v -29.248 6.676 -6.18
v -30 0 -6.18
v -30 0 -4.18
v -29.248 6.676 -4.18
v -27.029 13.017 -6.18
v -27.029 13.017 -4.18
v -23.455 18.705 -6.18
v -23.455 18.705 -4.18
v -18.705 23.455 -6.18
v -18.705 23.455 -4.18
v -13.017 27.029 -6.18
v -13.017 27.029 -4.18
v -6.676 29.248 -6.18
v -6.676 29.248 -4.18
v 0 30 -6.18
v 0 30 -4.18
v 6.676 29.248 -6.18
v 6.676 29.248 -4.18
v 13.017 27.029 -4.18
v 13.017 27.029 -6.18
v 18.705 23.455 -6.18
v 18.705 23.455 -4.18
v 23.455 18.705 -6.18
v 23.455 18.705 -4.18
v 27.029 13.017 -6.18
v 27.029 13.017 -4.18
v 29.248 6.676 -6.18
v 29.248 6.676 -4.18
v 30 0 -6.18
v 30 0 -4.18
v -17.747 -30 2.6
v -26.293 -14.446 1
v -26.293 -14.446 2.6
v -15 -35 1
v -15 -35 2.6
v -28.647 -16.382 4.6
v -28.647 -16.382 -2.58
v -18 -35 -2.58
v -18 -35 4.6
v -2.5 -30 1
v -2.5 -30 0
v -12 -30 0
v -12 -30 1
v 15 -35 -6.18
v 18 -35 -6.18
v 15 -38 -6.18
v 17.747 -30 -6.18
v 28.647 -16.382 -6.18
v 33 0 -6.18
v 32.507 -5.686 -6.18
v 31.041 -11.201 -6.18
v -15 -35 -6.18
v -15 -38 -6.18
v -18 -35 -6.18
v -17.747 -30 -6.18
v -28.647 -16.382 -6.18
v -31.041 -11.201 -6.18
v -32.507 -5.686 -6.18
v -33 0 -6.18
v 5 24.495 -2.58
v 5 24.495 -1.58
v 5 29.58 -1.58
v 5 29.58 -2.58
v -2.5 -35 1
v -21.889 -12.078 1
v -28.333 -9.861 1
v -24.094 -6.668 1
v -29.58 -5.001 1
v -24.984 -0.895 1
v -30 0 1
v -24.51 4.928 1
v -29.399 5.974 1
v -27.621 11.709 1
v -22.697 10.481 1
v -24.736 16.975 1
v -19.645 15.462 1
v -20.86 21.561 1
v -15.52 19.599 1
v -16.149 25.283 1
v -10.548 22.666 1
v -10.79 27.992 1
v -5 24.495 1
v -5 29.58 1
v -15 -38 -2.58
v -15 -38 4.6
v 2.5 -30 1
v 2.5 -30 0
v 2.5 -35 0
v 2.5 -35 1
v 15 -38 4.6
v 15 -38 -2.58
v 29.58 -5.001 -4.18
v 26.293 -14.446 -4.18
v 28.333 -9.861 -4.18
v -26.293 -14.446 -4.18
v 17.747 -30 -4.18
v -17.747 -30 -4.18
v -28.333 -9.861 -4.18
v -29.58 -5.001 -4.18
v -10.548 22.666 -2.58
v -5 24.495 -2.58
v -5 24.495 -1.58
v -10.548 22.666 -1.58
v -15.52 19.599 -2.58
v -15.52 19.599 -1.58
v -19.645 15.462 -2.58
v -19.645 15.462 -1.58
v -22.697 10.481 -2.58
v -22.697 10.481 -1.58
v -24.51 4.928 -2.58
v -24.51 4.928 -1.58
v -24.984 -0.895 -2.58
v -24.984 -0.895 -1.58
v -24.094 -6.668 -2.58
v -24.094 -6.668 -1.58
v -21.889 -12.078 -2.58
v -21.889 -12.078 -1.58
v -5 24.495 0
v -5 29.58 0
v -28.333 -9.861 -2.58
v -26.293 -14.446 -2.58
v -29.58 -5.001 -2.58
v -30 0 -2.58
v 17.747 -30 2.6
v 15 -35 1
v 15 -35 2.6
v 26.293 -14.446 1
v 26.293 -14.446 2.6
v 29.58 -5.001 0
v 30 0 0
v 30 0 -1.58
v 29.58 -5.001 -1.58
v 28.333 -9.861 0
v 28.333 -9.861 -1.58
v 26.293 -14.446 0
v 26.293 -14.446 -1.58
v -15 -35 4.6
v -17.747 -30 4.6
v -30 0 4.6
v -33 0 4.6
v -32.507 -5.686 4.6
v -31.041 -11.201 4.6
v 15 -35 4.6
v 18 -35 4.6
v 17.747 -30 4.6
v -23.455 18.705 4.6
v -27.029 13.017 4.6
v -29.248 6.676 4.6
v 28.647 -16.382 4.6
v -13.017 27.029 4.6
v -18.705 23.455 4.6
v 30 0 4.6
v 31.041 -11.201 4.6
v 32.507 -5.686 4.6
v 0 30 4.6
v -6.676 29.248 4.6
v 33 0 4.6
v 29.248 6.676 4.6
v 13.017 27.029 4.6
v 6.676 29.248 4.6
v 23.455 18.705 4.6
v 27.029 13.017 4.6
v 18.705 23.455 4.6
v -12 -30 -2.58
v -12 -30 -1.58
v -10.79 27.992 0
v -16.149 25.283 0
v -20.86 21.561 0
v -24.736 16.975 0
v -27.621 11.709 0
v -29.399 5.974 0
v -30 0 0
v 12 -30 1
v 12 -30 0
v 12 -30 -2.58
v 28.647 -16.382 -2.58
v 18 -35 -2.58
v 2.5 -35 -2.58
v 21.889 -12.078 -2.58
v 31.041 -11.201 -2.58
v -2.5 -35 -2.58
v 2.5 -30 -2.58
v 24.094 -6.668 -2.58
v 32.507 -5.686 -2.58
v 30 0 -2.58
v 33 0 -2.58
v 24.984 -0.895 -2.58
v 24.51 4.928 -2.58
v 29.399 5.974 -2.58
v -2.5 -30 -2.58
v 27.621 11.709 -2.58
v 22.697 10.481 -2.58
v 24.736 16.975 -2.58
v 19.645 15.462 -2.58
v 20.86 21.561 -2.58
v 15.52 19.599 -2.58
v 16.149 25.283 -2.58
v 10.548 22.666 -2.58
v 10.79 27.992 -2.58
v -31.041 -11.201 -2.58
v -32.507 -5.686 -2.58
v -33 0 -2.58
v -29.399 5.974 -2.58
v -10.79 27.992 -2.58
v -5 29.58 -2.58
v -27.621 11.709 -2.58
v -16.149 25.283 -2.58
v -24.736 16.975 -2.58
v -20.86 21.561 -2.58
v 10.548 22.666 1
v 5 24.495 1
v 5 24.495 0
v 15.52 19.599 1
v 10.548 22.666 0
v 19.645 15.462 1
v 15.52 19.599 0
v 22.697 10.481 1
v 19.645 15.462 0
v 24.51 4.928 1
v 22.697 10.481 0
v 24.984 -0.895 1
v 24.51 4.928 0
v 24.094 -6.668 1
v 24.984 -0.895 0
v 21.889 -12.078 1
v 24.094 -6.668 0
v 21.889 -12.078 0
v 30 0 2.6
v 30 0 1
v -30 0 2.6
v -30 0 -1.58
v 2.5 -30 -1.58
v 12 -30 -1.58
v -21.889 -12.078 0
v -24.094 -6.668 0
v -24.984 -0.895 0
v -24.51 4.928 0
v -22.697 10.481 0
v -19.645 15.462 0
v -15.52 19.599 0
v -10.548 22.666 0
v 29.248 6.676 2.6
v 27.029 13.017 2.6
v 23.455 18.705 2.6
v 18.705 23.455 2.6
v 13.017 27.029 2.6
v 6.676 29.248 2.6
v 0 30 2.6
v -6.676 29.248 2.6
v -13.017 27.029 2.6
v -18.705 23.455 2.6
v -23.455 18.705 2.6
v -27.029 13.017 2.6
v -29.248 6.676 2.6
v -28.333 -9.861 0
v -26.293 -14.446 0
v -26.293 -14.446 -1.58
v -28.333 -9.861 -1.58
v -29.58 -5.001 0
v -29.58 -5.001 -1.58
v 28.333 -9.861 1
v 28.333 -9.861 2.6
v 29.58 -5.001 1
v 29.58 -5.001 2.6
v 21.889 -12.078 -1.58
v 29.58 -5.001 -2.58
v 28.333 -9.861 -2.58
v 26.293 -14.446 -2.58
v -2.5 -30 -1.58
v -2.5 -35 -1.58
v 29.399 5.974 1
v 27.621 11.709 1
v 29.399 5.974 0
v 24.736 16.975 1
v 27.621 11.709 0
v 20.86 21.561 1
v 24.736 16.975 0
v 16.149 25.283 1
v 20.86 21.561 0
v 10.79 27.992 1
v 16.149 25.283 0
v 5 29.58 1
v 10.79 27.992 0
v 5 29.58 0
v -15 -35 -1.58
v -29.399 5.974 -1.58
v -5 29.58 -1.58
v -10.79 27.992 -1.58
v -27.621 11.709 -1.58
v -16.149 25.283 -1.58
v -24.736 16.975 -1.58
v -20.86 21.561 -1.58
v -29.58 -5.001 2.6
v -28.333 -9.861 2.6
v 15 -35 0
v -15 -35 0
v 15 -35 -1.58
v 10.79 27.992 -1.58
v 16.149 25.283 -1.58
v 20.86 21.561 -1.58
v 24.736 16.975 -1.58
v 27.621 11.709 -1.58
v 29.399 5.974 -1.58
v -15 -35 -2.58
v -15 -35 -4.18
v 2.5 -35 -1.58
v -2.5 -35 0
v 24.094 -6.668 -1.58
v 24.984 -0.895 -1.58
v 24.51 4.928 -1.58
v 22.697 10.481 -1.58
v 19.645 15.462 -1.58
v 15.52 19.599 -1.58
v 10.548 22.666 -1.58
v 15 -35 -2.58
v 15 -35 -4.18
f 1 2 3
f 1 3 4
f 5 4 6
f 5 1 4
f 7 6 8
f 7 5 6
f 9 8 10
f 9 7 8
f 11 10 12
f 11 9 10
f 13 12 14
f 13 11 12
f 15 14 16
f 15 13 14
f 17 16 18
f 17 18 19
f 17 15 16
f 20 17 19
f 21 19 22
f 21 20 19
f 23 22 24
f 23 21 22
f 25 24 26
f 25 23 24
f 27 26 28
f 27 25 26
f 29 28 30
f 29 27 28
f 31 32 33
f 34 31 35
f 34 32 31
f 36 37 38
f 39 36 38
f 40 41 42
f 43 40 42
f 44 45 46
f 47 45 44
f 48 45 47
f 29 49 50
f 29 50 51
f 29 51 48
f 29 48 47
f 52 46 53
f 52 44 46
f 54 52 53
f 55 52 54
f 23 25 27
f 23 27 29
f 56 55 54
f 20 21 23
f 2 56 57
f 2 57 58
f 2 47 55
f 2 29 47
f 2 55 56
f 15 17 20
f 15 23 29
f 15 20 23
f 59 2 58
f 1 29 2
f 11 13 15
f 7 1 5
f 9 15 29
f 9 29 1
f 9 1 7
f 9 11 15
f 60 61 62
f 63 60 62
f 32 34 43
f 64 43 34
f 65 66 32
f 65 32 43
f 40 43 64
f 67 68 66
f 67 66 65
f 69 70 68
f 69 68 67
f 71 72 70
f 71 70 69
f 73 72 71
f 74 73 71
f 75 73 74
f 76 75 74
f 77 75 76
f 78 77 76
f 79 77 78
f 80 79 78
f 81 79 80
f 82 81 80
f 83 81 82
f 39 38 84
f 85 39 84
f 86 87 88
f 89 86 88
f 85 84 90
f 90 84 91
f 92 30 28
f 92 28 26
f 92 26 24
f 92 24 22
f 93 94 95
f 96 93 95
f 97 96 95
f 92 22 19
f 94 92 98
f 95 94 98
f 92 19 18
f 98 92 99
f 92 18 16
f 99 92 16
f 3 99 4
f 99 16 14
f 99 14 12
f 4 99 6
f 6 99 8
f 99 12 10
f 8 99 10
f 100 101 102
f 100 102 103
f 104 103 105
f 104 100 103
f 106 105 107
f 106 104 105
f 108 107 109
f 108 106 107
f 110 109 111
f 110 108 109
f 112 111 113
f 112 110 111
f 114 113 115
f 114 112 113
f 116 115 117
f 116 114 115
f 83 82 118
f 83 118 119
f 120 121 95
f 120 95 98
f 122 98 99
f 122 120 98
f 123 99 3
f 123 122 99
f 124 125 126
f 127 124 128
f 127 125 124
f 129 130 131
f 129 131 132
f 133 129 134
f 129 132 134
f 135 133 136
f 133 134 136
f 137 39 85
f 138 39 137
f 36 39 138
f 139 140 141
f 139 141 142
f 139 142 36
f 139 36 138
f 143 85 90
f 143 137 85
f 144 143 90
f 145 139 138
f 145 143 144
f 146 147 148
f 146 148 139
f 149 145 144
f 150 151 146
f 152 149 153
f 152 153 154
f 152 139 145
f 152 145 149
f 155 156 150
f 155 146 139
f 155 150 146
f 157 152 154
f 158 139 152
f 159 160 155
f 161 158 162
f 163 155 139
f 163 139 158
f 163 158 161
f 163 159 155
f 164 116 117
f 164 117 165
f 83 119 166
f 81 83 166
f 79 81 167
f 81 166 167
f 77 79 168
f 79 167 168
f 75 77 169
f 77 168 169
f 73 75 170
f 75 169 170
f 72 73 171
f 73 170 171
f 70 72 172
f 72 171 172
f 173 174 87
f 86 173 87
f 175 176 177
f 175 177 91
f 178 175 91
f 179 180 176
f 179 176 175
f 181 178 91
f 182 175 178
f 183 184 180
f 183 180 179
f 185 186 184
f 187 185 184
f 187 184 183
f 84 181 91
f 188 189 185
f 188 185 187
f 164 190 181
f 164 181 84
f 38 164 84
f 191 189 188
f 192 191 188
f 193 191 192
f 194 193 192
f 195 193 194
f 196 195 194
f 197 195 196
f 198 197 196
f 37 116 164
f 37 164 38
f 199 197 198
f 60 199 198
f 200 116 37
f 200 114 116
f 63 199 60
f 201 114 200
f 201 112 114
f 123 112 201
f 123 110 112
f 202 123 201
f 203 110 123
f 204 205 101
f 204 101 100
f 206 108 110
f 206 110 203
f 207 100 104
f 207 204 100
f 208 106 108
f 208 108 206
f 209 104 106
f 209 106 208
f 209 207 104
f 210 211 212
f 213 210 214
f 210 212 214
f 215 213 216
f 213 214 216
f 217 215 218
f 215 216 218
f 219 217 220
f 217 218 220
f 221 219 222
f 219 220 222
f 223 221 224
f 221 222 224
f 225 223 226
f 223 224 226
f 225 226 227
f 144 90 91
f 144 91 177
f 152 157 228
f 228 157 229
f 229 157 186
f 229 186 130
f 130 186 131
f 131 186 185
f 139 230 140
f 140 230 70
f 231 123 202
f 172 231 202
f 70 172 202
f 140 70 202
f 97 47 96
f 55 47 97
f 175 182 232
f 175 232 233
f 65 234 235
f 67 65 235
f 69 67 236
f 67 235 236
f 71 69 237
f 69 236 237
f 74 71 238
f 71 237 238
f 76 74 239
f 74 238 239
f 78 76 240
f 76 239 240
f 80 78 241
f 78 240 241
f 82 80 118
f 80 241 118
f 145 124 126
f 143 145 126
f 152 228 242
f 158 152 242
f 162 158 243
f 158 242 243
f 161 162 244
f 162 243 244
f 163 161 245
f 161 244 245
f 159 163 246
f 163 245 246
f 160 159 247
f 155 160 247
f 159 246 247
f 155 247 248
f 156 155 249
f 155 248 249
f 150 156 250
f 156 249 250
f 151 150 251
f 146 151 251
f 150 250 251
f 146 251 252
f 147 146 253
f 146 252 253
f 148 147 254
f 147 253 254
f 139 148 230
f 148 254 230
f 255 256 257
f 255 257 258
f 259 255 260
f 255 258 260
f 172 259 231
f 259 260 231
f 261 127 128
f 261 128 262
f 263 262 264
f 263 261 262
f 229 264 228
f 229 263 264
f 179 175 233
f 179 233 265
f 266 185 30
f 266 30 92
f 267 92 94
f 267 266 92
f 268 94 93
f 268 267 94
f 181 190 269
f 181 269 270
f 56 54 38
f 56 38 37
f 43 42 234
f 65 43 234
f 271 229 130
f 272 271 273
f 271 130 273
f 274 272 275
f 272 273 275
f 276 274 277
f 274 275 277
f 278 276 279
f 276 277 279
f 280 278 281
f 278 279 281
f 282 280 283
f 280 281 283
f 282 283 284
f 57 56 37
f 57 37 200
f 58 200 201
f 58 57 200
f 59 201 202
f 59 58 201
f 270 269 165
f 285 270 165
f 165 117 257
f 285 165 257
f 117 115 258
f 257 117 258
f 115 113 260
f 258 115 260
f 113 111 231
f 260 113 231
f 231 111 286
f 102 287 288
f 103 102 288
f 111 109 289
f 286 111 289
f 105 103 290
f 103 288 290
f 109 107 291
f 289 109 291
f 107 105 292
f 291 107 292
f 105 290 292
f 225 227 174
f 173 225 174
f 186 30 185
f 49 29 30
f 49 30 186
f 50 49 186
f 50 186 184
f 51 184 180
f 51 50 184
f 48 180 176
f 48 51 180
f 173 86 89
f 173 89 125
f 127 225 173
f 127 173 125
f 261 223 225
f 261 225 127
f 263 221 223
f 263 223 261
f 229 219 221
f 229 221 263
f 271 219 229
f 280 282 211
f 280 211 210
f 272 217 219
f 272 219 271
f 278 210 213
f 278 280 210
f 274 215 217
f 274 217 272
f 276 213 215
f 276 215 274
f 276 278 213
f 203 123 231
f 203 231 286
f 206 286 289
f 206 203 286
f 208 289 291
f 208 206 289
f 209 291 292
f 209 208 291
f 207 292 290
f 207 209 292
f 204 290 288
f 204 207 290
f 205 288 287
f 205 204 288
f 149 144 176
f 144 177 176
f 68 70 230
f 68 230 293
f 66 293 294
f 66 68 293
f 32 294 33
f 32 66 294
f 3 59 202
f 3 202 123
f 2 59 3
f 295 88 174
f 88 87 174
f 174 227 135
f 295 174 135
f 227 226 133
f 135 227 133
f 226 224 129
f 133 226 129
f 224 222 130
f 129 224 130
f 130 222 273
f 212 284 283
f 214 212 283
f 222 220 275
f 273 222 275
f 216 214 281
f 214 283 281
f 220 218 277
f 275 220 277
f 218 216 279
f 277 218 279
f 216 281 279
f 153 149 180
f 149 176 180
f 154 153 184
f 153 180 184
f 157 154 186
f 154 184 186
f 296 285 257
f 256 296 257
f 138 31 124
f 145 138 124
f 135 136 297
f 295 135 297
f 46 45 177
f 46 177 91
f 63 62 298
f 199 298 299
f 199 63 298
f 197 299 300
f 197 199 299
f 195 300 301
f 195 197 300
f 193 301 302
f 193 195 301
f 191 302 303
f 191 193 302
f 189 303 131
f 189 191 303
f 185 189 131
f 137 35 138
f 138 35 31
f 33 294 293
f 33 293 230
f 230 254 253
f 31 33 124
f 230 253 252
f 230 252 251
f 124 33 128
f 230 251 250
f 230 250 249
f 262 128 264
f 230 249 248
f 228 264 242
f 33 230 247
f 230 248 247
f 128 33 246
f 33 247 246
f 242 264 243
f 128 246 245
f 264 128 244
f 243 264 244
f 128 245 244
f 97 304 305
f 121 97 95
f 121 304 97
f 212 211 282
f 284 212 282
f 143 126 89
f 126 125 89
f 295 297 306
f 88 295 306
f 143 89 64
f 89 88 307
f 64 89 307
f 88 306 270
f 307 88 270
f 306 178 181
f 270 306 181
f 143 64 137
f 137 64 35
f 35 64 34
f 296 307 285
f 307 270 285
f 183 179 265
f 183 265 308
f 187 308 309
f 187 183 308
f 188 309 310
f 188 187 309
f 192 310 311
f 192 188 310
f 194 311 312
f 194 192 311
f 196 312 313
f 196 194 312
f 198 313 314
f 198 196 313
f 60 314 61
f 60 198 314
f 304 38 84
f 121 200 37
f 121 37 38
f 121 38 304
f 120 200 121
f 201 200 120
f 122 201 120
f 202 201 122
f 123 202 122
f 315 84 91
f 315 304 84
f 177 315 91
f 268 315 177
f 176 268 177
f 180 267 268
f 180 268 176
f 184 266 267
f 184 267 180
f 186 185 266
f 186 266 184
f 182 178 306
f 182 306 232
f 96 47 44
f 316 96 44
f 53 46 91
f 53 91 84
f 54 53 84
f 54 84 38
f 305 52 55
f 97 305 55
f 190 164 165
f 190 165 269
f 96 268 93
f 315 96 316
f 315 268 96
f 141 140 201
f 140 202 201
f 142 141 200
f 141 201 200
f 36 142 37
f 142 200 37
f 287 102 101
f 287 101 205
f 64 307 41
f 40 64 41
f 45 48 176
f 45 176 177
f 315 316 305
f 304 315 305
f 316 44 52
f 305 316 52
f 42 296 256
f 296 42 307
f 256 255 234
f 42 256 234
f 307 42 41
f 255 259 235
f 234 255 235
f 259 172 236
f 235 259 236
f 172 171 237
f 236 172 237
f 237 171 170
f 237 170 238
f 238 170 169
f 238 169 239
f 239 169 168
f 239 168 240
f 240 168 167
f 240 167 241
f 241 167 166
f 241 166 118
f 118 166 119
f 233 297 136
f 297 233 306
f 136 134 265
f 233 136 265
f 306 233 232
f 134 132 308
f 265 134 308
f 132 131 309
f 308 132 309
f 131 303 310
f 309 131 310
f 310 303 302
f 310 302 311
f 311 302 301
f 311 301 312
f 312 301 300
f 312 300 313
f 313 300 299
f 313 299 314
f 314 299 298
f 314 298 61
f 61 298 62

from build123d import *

# Parameters (mm, degrees)
RESSALTO_EXTRUS_O3_DEPTH = 1
RESSALTO_EXTRUS_O4_START = -3.58
RESSALTO_EXTRUS_O4_DEPTH = 3.58
RESSALTO_EXTRUS_O5_DEPTH = 1
RESSALTO_EXTRUS_O6_DEPTH = 1.6
RESSALTO_EXTRUS_O7_DEPTH = 1.6
ESBO_O9_W                = 10
ESBO_O9_H                = 12.857862002
CORTE_EXTRUS_O2_DEPTH    = 4
RESSALTO_EXTRUS_O8_DEPTH = 2
RESSALTO_EXTRUS_O9_START = 2
RESSALTO_EXTRUS_O9_DEPTH = 2


with BuildPart() as part:
    # Esboço1 → Ressalto-extrusão3 (new body)
    with BuildSketch(Plane.XY):
        with BuildLine():
            Line((5, -35), (15, -35))
            Line((15, -35), (26.292884648, -14.44590658))
            ThreePointArc((26.292884648, -14.44590658), (0, 30), (-26.292884648, -14.44590658))
            Line((-26.292884648, -14.44590658), (-15, -35))
            Line((-15, -35), (-5, -35))
            Line((-5, -35), (-2.5, -35))
            Line((-2.5, -35), (-2.5, -32.5))
            Line((-2.5, -32.5), (-2.5, -30))
            Line((-2.5, -30), (-5, -30))
            Line((-5, -30), (-12, -30))
            Line((-12, -30), (-21.889001071, -12.077732905))
            ThreePointArc((-21.889001071, -12.077732905), (0, 25), (21.889001071, -12.077732905))
            Line((21.889001071, -12.077732905), (12, -30))
            Line((12, -30), (5, -30))
            Line((5, -30), (2.5, -30))
            Line((2.5, -30), (2.5, -32.5))
            Line((2.5, -32.5), (2.5, -35))
            Line((2.5, -35), (5, -35))
        make_face()
    extrude(amount=RESSALTO_EXTRUS_O3_DEPTH)

    # Esboço2 → Ressalto-extrusão4 (add)
    with BuildSketch(Plane.XY.offset(1).offset(RESSALTO_EXTRUS_O4_START)):
        Polygon((-2.5, -35), (-15, -35), (-15, -38), (15, -38), (15, -35), (2.5, -35), align=None)
        Polygon((18, -35), (15, -38), (15, -35), align=None)
        with BuildLine():
            Line((33, 0), (30, 0))
            ThreePointArc((30, 0), (29.058445755, -7.45699204), (26.292884648, -14.44590658))
            Line((26.292884648, -14.44590658), (15, -35))
            Line((15, -35), (18, -35))
            Line((18, -35), (28.646862641, -16.381613499))
            ThreePointArc((28.646862641, -16.381613499), (31.893153397, -8.47506734), (33, 0))
        make_face()
        Polygon((-15, -35), (-18, -35), (-15, -38), align=None)
        with BuildLine():
            ThreePointArc((-26.292884648, -14.44590658), (-29.058445755, -7.45699204), (-30, 0))
            Line((-30, 0), (-33, 0))
            ThreePointArc((-33, 0), (-31.893153397, -8.47506734), (-28.646862641, -16.381613499))
            Line((-28.646862641, -16.381613499), (-18, -35))
            Line((-18, -35), (-15, -35))
            Line((-15, -35), (-26.292884648, -14.44590658))
        make_face()
    extrude(amount=RESSALTO_EXTRUS_O4_DEPTH)

    # Esboço4 → Ressalto-extrusão5 (add)
    with BuildSketch(Plane(origin=(0, 0, -2.58), x_dir=(-1, 0, 0), z_dir=(0, 0, -1))):
        with BuildLine():
            Line((-15, -35), (-2.5, -35))
            Line((-2.5, -35), (-2.5, -30))
            Line((-2.5, -30), (-12, -30))
            Line((-12, -30), (-21.889001071, -12.077732905))
            ThreePointArc((-21.889001071, -12.077732905), (0, 25), (21.889001071, -12.077732905))
            Line((21.889001071, -12.077732905), (12, -30))
            Line((12, -30), (2.5, -30))
            Line((2.5, -30), (2.5, -35))
            Line((2.5, -35), (15, -35))
            Line((15, -35), (26.292884648, -14.44590658))
            ThreePointArc((26.292884648, -14.44590658), (0, 30), (-26.292884648, -14.44590658))
            Line((-26.292884648, -14.44590658), (-15, -35))
        make_face()
    extrude(amount=-RESSALTO_EXTRUS_O5_DEPTH)

    # Esboço5 → Ressalto-extrusão6 (add)
    with BuildSketch(Plane.XY.offset(1)):
        with BuildLine():
            Line((-15, -38), (-18, -35))
            Line((-18, -35), (-28.646862641, -16.381613499))
            ThreePointArc((-28.646862641, -16.381613499), (-31.893153397, -8.47506734), (-33, 0))
            Line((-33, 0), (-29.999999999, 0))
            ThreePointArc((-29.999999999, 0), (-29.058445755, -7.456992039), (-26.292884647, -14.445906578))
            Line((-26.292884647, -14.445906578), (-15, -35))
            Line((-15, -35), (-12.5, -35))
            Line((-12.5, -35), (0, -35))
            Line((0, -35), (12.5, -35))
            Line((12.5, -35), (14.999999999, -35))
            Line((14.999999999, -35), (26.292884647, -14.445906579))
            ThreePointArc((26.292884647, -14.445906579), (29.058445755, -7.45699204), (29.999999999, 0))
            Line((29.999999999, 0), (33, 0))
            ThreePointArc((33, 0), (31.893153397, -8.47506734), (28.646862641, -16.381613499))
            Line((28.646862641, -16.381613499), (18, -35))
            Line((18, -35), (15, -38))
            Line((15, -38), (-15, -38))
        make_face()
    extrude(amount=RESSALTO_EXTRUS_O6_DEPTH)

    # Esboço9 → Corte-extrusão2 (cut)
    with BuildSketch(Plane.XY.offset(1)):
        with Locations((0, 30)):
            Rectangle(ESBO_O9_W, ESBO_O9_H)
    extrude(amount=-CORTE_EXTRUS_O2_DEPTH, mode=Mode.SUBTRACT)

    # Esboço8 → Ressalto-extrusão8 (add)
    with BuildSketch(Plane.XY.offset(2.6)):
        with BuildLine():
            Line((-15, -38), (15, -38))
            Line((15, -38), (18, -35))
            Line((18, -35), (28.646862641, -16.381613499))
            ThreePointArc((28.646862641, -16.381613499), (31.893153397, -8.47506734), (33, 0))
            Line((33, 0), (30, 0))
            ThreePointArc((30, 0), (0, 30), (-30, 0))
            Line((-30, 0), (-33, 0))
            ThreePointArc((-33, 0), (-31.893153397, -8.47506734), (-28.646862641, -16.381613499))
            Line((-28.646862641, -16.381613499), (-18, -35))
            Line((-18, -35), (-15, -38))
        make_face()
        Polygon((-12, -30), (17.747113291, -30), (14.999999999, -35), (-15, -35), (-17.747113292, -30), align=None, mode=Mode.SUBTRACT)
    extrude(amount=RESSALTO_EXTRUS_O8_DEPTH)


with BuildPart() as body_2:
    # Esboço6 → Ressalto-extrusão7 (new body)
    with BuildSketch(Plane(origin=(0, 0, -2.58), x_dir=(-1, 0, 0), z_dir=(0, 0, -1))):
        with BuildLine():
            Line((-15, -38), (-18, -35))
            Line((-18, -35), (-28.646862641, -16.381613499))
            ThreePointArc((-28.646862641, -16.381613499), (-31.893153397, -8.47506734), (-33, 0))
            Line((-33, 0), (-30, 0))
            ThreePointArc((-30, 0), (-29.058445755, -7.45699204), (-26.292884648, -14.44590658))
            Line((-26.292884648, -14.44590658), (-15, -35))
            Line((-15, -35), (15, -35))
            Line((15, -35), (26.292884648, -14.44590658))
            ThreePointArc((26.292884648, -14.44590658), (29.058445755, -7.45699204), (30, 0))
            Line((30, 0), (33, 0))
            ThreePointArc((33, 0), (31.893153397, -8.47506734), (28.646862641, -16.381613499))
            Line((28.646862641, -16.381613499), (18, -35))
            Line((18, -35), (15, -38))
            Line((15, -38), (-15, -38))
        make_face()
    extrude(amount=RESSALTO_EXTRUS_O7_DEPTH)

    # Esboço11 → Ressalto-extrusão9 (add)
    with BuildSketch(Plane(origin=(0, 0, -4.18), x_dir=(-1, 0, 0), z_dir=(0, 0, -1)).offset(RESSALTO_EXTRUS_O9_START)):
        with BuildLine():
            Line((-15, -38), (15, -38))
            Line((15, -38), (18, -35))
            Line((18, -35), (28.646862641, -16.381613499))
            ThreePointArc((28.646862641, -16.381613499), (31.893153397, -8.47506734), (33, 0))
            Line((33, 0), (30, 0))
            ThreePointArc((30, 0), (0, 30), (-30, 0))
            Line((-30, 0), (-33, 0))
            ThreePointArc((-33, 0), (-31.893153397, -8.47506734), (-28.646862641, -16.381613499))
            Line((-28.646862641, -16.381613499), (-18, -35))
            Line((-18, -35), (-15, -38))
        make_face()
        Polygon((-15, -35), (15, -35), (17.747113292, -30), (-12, -30), (-17.747113292, -30), align=None, mode=Mode.SUBTRACT)
    extrude(amount=-RESSALTO_EXTRUS_O9_DEPTH)


solid = Compound([part.part, body_2.part])
